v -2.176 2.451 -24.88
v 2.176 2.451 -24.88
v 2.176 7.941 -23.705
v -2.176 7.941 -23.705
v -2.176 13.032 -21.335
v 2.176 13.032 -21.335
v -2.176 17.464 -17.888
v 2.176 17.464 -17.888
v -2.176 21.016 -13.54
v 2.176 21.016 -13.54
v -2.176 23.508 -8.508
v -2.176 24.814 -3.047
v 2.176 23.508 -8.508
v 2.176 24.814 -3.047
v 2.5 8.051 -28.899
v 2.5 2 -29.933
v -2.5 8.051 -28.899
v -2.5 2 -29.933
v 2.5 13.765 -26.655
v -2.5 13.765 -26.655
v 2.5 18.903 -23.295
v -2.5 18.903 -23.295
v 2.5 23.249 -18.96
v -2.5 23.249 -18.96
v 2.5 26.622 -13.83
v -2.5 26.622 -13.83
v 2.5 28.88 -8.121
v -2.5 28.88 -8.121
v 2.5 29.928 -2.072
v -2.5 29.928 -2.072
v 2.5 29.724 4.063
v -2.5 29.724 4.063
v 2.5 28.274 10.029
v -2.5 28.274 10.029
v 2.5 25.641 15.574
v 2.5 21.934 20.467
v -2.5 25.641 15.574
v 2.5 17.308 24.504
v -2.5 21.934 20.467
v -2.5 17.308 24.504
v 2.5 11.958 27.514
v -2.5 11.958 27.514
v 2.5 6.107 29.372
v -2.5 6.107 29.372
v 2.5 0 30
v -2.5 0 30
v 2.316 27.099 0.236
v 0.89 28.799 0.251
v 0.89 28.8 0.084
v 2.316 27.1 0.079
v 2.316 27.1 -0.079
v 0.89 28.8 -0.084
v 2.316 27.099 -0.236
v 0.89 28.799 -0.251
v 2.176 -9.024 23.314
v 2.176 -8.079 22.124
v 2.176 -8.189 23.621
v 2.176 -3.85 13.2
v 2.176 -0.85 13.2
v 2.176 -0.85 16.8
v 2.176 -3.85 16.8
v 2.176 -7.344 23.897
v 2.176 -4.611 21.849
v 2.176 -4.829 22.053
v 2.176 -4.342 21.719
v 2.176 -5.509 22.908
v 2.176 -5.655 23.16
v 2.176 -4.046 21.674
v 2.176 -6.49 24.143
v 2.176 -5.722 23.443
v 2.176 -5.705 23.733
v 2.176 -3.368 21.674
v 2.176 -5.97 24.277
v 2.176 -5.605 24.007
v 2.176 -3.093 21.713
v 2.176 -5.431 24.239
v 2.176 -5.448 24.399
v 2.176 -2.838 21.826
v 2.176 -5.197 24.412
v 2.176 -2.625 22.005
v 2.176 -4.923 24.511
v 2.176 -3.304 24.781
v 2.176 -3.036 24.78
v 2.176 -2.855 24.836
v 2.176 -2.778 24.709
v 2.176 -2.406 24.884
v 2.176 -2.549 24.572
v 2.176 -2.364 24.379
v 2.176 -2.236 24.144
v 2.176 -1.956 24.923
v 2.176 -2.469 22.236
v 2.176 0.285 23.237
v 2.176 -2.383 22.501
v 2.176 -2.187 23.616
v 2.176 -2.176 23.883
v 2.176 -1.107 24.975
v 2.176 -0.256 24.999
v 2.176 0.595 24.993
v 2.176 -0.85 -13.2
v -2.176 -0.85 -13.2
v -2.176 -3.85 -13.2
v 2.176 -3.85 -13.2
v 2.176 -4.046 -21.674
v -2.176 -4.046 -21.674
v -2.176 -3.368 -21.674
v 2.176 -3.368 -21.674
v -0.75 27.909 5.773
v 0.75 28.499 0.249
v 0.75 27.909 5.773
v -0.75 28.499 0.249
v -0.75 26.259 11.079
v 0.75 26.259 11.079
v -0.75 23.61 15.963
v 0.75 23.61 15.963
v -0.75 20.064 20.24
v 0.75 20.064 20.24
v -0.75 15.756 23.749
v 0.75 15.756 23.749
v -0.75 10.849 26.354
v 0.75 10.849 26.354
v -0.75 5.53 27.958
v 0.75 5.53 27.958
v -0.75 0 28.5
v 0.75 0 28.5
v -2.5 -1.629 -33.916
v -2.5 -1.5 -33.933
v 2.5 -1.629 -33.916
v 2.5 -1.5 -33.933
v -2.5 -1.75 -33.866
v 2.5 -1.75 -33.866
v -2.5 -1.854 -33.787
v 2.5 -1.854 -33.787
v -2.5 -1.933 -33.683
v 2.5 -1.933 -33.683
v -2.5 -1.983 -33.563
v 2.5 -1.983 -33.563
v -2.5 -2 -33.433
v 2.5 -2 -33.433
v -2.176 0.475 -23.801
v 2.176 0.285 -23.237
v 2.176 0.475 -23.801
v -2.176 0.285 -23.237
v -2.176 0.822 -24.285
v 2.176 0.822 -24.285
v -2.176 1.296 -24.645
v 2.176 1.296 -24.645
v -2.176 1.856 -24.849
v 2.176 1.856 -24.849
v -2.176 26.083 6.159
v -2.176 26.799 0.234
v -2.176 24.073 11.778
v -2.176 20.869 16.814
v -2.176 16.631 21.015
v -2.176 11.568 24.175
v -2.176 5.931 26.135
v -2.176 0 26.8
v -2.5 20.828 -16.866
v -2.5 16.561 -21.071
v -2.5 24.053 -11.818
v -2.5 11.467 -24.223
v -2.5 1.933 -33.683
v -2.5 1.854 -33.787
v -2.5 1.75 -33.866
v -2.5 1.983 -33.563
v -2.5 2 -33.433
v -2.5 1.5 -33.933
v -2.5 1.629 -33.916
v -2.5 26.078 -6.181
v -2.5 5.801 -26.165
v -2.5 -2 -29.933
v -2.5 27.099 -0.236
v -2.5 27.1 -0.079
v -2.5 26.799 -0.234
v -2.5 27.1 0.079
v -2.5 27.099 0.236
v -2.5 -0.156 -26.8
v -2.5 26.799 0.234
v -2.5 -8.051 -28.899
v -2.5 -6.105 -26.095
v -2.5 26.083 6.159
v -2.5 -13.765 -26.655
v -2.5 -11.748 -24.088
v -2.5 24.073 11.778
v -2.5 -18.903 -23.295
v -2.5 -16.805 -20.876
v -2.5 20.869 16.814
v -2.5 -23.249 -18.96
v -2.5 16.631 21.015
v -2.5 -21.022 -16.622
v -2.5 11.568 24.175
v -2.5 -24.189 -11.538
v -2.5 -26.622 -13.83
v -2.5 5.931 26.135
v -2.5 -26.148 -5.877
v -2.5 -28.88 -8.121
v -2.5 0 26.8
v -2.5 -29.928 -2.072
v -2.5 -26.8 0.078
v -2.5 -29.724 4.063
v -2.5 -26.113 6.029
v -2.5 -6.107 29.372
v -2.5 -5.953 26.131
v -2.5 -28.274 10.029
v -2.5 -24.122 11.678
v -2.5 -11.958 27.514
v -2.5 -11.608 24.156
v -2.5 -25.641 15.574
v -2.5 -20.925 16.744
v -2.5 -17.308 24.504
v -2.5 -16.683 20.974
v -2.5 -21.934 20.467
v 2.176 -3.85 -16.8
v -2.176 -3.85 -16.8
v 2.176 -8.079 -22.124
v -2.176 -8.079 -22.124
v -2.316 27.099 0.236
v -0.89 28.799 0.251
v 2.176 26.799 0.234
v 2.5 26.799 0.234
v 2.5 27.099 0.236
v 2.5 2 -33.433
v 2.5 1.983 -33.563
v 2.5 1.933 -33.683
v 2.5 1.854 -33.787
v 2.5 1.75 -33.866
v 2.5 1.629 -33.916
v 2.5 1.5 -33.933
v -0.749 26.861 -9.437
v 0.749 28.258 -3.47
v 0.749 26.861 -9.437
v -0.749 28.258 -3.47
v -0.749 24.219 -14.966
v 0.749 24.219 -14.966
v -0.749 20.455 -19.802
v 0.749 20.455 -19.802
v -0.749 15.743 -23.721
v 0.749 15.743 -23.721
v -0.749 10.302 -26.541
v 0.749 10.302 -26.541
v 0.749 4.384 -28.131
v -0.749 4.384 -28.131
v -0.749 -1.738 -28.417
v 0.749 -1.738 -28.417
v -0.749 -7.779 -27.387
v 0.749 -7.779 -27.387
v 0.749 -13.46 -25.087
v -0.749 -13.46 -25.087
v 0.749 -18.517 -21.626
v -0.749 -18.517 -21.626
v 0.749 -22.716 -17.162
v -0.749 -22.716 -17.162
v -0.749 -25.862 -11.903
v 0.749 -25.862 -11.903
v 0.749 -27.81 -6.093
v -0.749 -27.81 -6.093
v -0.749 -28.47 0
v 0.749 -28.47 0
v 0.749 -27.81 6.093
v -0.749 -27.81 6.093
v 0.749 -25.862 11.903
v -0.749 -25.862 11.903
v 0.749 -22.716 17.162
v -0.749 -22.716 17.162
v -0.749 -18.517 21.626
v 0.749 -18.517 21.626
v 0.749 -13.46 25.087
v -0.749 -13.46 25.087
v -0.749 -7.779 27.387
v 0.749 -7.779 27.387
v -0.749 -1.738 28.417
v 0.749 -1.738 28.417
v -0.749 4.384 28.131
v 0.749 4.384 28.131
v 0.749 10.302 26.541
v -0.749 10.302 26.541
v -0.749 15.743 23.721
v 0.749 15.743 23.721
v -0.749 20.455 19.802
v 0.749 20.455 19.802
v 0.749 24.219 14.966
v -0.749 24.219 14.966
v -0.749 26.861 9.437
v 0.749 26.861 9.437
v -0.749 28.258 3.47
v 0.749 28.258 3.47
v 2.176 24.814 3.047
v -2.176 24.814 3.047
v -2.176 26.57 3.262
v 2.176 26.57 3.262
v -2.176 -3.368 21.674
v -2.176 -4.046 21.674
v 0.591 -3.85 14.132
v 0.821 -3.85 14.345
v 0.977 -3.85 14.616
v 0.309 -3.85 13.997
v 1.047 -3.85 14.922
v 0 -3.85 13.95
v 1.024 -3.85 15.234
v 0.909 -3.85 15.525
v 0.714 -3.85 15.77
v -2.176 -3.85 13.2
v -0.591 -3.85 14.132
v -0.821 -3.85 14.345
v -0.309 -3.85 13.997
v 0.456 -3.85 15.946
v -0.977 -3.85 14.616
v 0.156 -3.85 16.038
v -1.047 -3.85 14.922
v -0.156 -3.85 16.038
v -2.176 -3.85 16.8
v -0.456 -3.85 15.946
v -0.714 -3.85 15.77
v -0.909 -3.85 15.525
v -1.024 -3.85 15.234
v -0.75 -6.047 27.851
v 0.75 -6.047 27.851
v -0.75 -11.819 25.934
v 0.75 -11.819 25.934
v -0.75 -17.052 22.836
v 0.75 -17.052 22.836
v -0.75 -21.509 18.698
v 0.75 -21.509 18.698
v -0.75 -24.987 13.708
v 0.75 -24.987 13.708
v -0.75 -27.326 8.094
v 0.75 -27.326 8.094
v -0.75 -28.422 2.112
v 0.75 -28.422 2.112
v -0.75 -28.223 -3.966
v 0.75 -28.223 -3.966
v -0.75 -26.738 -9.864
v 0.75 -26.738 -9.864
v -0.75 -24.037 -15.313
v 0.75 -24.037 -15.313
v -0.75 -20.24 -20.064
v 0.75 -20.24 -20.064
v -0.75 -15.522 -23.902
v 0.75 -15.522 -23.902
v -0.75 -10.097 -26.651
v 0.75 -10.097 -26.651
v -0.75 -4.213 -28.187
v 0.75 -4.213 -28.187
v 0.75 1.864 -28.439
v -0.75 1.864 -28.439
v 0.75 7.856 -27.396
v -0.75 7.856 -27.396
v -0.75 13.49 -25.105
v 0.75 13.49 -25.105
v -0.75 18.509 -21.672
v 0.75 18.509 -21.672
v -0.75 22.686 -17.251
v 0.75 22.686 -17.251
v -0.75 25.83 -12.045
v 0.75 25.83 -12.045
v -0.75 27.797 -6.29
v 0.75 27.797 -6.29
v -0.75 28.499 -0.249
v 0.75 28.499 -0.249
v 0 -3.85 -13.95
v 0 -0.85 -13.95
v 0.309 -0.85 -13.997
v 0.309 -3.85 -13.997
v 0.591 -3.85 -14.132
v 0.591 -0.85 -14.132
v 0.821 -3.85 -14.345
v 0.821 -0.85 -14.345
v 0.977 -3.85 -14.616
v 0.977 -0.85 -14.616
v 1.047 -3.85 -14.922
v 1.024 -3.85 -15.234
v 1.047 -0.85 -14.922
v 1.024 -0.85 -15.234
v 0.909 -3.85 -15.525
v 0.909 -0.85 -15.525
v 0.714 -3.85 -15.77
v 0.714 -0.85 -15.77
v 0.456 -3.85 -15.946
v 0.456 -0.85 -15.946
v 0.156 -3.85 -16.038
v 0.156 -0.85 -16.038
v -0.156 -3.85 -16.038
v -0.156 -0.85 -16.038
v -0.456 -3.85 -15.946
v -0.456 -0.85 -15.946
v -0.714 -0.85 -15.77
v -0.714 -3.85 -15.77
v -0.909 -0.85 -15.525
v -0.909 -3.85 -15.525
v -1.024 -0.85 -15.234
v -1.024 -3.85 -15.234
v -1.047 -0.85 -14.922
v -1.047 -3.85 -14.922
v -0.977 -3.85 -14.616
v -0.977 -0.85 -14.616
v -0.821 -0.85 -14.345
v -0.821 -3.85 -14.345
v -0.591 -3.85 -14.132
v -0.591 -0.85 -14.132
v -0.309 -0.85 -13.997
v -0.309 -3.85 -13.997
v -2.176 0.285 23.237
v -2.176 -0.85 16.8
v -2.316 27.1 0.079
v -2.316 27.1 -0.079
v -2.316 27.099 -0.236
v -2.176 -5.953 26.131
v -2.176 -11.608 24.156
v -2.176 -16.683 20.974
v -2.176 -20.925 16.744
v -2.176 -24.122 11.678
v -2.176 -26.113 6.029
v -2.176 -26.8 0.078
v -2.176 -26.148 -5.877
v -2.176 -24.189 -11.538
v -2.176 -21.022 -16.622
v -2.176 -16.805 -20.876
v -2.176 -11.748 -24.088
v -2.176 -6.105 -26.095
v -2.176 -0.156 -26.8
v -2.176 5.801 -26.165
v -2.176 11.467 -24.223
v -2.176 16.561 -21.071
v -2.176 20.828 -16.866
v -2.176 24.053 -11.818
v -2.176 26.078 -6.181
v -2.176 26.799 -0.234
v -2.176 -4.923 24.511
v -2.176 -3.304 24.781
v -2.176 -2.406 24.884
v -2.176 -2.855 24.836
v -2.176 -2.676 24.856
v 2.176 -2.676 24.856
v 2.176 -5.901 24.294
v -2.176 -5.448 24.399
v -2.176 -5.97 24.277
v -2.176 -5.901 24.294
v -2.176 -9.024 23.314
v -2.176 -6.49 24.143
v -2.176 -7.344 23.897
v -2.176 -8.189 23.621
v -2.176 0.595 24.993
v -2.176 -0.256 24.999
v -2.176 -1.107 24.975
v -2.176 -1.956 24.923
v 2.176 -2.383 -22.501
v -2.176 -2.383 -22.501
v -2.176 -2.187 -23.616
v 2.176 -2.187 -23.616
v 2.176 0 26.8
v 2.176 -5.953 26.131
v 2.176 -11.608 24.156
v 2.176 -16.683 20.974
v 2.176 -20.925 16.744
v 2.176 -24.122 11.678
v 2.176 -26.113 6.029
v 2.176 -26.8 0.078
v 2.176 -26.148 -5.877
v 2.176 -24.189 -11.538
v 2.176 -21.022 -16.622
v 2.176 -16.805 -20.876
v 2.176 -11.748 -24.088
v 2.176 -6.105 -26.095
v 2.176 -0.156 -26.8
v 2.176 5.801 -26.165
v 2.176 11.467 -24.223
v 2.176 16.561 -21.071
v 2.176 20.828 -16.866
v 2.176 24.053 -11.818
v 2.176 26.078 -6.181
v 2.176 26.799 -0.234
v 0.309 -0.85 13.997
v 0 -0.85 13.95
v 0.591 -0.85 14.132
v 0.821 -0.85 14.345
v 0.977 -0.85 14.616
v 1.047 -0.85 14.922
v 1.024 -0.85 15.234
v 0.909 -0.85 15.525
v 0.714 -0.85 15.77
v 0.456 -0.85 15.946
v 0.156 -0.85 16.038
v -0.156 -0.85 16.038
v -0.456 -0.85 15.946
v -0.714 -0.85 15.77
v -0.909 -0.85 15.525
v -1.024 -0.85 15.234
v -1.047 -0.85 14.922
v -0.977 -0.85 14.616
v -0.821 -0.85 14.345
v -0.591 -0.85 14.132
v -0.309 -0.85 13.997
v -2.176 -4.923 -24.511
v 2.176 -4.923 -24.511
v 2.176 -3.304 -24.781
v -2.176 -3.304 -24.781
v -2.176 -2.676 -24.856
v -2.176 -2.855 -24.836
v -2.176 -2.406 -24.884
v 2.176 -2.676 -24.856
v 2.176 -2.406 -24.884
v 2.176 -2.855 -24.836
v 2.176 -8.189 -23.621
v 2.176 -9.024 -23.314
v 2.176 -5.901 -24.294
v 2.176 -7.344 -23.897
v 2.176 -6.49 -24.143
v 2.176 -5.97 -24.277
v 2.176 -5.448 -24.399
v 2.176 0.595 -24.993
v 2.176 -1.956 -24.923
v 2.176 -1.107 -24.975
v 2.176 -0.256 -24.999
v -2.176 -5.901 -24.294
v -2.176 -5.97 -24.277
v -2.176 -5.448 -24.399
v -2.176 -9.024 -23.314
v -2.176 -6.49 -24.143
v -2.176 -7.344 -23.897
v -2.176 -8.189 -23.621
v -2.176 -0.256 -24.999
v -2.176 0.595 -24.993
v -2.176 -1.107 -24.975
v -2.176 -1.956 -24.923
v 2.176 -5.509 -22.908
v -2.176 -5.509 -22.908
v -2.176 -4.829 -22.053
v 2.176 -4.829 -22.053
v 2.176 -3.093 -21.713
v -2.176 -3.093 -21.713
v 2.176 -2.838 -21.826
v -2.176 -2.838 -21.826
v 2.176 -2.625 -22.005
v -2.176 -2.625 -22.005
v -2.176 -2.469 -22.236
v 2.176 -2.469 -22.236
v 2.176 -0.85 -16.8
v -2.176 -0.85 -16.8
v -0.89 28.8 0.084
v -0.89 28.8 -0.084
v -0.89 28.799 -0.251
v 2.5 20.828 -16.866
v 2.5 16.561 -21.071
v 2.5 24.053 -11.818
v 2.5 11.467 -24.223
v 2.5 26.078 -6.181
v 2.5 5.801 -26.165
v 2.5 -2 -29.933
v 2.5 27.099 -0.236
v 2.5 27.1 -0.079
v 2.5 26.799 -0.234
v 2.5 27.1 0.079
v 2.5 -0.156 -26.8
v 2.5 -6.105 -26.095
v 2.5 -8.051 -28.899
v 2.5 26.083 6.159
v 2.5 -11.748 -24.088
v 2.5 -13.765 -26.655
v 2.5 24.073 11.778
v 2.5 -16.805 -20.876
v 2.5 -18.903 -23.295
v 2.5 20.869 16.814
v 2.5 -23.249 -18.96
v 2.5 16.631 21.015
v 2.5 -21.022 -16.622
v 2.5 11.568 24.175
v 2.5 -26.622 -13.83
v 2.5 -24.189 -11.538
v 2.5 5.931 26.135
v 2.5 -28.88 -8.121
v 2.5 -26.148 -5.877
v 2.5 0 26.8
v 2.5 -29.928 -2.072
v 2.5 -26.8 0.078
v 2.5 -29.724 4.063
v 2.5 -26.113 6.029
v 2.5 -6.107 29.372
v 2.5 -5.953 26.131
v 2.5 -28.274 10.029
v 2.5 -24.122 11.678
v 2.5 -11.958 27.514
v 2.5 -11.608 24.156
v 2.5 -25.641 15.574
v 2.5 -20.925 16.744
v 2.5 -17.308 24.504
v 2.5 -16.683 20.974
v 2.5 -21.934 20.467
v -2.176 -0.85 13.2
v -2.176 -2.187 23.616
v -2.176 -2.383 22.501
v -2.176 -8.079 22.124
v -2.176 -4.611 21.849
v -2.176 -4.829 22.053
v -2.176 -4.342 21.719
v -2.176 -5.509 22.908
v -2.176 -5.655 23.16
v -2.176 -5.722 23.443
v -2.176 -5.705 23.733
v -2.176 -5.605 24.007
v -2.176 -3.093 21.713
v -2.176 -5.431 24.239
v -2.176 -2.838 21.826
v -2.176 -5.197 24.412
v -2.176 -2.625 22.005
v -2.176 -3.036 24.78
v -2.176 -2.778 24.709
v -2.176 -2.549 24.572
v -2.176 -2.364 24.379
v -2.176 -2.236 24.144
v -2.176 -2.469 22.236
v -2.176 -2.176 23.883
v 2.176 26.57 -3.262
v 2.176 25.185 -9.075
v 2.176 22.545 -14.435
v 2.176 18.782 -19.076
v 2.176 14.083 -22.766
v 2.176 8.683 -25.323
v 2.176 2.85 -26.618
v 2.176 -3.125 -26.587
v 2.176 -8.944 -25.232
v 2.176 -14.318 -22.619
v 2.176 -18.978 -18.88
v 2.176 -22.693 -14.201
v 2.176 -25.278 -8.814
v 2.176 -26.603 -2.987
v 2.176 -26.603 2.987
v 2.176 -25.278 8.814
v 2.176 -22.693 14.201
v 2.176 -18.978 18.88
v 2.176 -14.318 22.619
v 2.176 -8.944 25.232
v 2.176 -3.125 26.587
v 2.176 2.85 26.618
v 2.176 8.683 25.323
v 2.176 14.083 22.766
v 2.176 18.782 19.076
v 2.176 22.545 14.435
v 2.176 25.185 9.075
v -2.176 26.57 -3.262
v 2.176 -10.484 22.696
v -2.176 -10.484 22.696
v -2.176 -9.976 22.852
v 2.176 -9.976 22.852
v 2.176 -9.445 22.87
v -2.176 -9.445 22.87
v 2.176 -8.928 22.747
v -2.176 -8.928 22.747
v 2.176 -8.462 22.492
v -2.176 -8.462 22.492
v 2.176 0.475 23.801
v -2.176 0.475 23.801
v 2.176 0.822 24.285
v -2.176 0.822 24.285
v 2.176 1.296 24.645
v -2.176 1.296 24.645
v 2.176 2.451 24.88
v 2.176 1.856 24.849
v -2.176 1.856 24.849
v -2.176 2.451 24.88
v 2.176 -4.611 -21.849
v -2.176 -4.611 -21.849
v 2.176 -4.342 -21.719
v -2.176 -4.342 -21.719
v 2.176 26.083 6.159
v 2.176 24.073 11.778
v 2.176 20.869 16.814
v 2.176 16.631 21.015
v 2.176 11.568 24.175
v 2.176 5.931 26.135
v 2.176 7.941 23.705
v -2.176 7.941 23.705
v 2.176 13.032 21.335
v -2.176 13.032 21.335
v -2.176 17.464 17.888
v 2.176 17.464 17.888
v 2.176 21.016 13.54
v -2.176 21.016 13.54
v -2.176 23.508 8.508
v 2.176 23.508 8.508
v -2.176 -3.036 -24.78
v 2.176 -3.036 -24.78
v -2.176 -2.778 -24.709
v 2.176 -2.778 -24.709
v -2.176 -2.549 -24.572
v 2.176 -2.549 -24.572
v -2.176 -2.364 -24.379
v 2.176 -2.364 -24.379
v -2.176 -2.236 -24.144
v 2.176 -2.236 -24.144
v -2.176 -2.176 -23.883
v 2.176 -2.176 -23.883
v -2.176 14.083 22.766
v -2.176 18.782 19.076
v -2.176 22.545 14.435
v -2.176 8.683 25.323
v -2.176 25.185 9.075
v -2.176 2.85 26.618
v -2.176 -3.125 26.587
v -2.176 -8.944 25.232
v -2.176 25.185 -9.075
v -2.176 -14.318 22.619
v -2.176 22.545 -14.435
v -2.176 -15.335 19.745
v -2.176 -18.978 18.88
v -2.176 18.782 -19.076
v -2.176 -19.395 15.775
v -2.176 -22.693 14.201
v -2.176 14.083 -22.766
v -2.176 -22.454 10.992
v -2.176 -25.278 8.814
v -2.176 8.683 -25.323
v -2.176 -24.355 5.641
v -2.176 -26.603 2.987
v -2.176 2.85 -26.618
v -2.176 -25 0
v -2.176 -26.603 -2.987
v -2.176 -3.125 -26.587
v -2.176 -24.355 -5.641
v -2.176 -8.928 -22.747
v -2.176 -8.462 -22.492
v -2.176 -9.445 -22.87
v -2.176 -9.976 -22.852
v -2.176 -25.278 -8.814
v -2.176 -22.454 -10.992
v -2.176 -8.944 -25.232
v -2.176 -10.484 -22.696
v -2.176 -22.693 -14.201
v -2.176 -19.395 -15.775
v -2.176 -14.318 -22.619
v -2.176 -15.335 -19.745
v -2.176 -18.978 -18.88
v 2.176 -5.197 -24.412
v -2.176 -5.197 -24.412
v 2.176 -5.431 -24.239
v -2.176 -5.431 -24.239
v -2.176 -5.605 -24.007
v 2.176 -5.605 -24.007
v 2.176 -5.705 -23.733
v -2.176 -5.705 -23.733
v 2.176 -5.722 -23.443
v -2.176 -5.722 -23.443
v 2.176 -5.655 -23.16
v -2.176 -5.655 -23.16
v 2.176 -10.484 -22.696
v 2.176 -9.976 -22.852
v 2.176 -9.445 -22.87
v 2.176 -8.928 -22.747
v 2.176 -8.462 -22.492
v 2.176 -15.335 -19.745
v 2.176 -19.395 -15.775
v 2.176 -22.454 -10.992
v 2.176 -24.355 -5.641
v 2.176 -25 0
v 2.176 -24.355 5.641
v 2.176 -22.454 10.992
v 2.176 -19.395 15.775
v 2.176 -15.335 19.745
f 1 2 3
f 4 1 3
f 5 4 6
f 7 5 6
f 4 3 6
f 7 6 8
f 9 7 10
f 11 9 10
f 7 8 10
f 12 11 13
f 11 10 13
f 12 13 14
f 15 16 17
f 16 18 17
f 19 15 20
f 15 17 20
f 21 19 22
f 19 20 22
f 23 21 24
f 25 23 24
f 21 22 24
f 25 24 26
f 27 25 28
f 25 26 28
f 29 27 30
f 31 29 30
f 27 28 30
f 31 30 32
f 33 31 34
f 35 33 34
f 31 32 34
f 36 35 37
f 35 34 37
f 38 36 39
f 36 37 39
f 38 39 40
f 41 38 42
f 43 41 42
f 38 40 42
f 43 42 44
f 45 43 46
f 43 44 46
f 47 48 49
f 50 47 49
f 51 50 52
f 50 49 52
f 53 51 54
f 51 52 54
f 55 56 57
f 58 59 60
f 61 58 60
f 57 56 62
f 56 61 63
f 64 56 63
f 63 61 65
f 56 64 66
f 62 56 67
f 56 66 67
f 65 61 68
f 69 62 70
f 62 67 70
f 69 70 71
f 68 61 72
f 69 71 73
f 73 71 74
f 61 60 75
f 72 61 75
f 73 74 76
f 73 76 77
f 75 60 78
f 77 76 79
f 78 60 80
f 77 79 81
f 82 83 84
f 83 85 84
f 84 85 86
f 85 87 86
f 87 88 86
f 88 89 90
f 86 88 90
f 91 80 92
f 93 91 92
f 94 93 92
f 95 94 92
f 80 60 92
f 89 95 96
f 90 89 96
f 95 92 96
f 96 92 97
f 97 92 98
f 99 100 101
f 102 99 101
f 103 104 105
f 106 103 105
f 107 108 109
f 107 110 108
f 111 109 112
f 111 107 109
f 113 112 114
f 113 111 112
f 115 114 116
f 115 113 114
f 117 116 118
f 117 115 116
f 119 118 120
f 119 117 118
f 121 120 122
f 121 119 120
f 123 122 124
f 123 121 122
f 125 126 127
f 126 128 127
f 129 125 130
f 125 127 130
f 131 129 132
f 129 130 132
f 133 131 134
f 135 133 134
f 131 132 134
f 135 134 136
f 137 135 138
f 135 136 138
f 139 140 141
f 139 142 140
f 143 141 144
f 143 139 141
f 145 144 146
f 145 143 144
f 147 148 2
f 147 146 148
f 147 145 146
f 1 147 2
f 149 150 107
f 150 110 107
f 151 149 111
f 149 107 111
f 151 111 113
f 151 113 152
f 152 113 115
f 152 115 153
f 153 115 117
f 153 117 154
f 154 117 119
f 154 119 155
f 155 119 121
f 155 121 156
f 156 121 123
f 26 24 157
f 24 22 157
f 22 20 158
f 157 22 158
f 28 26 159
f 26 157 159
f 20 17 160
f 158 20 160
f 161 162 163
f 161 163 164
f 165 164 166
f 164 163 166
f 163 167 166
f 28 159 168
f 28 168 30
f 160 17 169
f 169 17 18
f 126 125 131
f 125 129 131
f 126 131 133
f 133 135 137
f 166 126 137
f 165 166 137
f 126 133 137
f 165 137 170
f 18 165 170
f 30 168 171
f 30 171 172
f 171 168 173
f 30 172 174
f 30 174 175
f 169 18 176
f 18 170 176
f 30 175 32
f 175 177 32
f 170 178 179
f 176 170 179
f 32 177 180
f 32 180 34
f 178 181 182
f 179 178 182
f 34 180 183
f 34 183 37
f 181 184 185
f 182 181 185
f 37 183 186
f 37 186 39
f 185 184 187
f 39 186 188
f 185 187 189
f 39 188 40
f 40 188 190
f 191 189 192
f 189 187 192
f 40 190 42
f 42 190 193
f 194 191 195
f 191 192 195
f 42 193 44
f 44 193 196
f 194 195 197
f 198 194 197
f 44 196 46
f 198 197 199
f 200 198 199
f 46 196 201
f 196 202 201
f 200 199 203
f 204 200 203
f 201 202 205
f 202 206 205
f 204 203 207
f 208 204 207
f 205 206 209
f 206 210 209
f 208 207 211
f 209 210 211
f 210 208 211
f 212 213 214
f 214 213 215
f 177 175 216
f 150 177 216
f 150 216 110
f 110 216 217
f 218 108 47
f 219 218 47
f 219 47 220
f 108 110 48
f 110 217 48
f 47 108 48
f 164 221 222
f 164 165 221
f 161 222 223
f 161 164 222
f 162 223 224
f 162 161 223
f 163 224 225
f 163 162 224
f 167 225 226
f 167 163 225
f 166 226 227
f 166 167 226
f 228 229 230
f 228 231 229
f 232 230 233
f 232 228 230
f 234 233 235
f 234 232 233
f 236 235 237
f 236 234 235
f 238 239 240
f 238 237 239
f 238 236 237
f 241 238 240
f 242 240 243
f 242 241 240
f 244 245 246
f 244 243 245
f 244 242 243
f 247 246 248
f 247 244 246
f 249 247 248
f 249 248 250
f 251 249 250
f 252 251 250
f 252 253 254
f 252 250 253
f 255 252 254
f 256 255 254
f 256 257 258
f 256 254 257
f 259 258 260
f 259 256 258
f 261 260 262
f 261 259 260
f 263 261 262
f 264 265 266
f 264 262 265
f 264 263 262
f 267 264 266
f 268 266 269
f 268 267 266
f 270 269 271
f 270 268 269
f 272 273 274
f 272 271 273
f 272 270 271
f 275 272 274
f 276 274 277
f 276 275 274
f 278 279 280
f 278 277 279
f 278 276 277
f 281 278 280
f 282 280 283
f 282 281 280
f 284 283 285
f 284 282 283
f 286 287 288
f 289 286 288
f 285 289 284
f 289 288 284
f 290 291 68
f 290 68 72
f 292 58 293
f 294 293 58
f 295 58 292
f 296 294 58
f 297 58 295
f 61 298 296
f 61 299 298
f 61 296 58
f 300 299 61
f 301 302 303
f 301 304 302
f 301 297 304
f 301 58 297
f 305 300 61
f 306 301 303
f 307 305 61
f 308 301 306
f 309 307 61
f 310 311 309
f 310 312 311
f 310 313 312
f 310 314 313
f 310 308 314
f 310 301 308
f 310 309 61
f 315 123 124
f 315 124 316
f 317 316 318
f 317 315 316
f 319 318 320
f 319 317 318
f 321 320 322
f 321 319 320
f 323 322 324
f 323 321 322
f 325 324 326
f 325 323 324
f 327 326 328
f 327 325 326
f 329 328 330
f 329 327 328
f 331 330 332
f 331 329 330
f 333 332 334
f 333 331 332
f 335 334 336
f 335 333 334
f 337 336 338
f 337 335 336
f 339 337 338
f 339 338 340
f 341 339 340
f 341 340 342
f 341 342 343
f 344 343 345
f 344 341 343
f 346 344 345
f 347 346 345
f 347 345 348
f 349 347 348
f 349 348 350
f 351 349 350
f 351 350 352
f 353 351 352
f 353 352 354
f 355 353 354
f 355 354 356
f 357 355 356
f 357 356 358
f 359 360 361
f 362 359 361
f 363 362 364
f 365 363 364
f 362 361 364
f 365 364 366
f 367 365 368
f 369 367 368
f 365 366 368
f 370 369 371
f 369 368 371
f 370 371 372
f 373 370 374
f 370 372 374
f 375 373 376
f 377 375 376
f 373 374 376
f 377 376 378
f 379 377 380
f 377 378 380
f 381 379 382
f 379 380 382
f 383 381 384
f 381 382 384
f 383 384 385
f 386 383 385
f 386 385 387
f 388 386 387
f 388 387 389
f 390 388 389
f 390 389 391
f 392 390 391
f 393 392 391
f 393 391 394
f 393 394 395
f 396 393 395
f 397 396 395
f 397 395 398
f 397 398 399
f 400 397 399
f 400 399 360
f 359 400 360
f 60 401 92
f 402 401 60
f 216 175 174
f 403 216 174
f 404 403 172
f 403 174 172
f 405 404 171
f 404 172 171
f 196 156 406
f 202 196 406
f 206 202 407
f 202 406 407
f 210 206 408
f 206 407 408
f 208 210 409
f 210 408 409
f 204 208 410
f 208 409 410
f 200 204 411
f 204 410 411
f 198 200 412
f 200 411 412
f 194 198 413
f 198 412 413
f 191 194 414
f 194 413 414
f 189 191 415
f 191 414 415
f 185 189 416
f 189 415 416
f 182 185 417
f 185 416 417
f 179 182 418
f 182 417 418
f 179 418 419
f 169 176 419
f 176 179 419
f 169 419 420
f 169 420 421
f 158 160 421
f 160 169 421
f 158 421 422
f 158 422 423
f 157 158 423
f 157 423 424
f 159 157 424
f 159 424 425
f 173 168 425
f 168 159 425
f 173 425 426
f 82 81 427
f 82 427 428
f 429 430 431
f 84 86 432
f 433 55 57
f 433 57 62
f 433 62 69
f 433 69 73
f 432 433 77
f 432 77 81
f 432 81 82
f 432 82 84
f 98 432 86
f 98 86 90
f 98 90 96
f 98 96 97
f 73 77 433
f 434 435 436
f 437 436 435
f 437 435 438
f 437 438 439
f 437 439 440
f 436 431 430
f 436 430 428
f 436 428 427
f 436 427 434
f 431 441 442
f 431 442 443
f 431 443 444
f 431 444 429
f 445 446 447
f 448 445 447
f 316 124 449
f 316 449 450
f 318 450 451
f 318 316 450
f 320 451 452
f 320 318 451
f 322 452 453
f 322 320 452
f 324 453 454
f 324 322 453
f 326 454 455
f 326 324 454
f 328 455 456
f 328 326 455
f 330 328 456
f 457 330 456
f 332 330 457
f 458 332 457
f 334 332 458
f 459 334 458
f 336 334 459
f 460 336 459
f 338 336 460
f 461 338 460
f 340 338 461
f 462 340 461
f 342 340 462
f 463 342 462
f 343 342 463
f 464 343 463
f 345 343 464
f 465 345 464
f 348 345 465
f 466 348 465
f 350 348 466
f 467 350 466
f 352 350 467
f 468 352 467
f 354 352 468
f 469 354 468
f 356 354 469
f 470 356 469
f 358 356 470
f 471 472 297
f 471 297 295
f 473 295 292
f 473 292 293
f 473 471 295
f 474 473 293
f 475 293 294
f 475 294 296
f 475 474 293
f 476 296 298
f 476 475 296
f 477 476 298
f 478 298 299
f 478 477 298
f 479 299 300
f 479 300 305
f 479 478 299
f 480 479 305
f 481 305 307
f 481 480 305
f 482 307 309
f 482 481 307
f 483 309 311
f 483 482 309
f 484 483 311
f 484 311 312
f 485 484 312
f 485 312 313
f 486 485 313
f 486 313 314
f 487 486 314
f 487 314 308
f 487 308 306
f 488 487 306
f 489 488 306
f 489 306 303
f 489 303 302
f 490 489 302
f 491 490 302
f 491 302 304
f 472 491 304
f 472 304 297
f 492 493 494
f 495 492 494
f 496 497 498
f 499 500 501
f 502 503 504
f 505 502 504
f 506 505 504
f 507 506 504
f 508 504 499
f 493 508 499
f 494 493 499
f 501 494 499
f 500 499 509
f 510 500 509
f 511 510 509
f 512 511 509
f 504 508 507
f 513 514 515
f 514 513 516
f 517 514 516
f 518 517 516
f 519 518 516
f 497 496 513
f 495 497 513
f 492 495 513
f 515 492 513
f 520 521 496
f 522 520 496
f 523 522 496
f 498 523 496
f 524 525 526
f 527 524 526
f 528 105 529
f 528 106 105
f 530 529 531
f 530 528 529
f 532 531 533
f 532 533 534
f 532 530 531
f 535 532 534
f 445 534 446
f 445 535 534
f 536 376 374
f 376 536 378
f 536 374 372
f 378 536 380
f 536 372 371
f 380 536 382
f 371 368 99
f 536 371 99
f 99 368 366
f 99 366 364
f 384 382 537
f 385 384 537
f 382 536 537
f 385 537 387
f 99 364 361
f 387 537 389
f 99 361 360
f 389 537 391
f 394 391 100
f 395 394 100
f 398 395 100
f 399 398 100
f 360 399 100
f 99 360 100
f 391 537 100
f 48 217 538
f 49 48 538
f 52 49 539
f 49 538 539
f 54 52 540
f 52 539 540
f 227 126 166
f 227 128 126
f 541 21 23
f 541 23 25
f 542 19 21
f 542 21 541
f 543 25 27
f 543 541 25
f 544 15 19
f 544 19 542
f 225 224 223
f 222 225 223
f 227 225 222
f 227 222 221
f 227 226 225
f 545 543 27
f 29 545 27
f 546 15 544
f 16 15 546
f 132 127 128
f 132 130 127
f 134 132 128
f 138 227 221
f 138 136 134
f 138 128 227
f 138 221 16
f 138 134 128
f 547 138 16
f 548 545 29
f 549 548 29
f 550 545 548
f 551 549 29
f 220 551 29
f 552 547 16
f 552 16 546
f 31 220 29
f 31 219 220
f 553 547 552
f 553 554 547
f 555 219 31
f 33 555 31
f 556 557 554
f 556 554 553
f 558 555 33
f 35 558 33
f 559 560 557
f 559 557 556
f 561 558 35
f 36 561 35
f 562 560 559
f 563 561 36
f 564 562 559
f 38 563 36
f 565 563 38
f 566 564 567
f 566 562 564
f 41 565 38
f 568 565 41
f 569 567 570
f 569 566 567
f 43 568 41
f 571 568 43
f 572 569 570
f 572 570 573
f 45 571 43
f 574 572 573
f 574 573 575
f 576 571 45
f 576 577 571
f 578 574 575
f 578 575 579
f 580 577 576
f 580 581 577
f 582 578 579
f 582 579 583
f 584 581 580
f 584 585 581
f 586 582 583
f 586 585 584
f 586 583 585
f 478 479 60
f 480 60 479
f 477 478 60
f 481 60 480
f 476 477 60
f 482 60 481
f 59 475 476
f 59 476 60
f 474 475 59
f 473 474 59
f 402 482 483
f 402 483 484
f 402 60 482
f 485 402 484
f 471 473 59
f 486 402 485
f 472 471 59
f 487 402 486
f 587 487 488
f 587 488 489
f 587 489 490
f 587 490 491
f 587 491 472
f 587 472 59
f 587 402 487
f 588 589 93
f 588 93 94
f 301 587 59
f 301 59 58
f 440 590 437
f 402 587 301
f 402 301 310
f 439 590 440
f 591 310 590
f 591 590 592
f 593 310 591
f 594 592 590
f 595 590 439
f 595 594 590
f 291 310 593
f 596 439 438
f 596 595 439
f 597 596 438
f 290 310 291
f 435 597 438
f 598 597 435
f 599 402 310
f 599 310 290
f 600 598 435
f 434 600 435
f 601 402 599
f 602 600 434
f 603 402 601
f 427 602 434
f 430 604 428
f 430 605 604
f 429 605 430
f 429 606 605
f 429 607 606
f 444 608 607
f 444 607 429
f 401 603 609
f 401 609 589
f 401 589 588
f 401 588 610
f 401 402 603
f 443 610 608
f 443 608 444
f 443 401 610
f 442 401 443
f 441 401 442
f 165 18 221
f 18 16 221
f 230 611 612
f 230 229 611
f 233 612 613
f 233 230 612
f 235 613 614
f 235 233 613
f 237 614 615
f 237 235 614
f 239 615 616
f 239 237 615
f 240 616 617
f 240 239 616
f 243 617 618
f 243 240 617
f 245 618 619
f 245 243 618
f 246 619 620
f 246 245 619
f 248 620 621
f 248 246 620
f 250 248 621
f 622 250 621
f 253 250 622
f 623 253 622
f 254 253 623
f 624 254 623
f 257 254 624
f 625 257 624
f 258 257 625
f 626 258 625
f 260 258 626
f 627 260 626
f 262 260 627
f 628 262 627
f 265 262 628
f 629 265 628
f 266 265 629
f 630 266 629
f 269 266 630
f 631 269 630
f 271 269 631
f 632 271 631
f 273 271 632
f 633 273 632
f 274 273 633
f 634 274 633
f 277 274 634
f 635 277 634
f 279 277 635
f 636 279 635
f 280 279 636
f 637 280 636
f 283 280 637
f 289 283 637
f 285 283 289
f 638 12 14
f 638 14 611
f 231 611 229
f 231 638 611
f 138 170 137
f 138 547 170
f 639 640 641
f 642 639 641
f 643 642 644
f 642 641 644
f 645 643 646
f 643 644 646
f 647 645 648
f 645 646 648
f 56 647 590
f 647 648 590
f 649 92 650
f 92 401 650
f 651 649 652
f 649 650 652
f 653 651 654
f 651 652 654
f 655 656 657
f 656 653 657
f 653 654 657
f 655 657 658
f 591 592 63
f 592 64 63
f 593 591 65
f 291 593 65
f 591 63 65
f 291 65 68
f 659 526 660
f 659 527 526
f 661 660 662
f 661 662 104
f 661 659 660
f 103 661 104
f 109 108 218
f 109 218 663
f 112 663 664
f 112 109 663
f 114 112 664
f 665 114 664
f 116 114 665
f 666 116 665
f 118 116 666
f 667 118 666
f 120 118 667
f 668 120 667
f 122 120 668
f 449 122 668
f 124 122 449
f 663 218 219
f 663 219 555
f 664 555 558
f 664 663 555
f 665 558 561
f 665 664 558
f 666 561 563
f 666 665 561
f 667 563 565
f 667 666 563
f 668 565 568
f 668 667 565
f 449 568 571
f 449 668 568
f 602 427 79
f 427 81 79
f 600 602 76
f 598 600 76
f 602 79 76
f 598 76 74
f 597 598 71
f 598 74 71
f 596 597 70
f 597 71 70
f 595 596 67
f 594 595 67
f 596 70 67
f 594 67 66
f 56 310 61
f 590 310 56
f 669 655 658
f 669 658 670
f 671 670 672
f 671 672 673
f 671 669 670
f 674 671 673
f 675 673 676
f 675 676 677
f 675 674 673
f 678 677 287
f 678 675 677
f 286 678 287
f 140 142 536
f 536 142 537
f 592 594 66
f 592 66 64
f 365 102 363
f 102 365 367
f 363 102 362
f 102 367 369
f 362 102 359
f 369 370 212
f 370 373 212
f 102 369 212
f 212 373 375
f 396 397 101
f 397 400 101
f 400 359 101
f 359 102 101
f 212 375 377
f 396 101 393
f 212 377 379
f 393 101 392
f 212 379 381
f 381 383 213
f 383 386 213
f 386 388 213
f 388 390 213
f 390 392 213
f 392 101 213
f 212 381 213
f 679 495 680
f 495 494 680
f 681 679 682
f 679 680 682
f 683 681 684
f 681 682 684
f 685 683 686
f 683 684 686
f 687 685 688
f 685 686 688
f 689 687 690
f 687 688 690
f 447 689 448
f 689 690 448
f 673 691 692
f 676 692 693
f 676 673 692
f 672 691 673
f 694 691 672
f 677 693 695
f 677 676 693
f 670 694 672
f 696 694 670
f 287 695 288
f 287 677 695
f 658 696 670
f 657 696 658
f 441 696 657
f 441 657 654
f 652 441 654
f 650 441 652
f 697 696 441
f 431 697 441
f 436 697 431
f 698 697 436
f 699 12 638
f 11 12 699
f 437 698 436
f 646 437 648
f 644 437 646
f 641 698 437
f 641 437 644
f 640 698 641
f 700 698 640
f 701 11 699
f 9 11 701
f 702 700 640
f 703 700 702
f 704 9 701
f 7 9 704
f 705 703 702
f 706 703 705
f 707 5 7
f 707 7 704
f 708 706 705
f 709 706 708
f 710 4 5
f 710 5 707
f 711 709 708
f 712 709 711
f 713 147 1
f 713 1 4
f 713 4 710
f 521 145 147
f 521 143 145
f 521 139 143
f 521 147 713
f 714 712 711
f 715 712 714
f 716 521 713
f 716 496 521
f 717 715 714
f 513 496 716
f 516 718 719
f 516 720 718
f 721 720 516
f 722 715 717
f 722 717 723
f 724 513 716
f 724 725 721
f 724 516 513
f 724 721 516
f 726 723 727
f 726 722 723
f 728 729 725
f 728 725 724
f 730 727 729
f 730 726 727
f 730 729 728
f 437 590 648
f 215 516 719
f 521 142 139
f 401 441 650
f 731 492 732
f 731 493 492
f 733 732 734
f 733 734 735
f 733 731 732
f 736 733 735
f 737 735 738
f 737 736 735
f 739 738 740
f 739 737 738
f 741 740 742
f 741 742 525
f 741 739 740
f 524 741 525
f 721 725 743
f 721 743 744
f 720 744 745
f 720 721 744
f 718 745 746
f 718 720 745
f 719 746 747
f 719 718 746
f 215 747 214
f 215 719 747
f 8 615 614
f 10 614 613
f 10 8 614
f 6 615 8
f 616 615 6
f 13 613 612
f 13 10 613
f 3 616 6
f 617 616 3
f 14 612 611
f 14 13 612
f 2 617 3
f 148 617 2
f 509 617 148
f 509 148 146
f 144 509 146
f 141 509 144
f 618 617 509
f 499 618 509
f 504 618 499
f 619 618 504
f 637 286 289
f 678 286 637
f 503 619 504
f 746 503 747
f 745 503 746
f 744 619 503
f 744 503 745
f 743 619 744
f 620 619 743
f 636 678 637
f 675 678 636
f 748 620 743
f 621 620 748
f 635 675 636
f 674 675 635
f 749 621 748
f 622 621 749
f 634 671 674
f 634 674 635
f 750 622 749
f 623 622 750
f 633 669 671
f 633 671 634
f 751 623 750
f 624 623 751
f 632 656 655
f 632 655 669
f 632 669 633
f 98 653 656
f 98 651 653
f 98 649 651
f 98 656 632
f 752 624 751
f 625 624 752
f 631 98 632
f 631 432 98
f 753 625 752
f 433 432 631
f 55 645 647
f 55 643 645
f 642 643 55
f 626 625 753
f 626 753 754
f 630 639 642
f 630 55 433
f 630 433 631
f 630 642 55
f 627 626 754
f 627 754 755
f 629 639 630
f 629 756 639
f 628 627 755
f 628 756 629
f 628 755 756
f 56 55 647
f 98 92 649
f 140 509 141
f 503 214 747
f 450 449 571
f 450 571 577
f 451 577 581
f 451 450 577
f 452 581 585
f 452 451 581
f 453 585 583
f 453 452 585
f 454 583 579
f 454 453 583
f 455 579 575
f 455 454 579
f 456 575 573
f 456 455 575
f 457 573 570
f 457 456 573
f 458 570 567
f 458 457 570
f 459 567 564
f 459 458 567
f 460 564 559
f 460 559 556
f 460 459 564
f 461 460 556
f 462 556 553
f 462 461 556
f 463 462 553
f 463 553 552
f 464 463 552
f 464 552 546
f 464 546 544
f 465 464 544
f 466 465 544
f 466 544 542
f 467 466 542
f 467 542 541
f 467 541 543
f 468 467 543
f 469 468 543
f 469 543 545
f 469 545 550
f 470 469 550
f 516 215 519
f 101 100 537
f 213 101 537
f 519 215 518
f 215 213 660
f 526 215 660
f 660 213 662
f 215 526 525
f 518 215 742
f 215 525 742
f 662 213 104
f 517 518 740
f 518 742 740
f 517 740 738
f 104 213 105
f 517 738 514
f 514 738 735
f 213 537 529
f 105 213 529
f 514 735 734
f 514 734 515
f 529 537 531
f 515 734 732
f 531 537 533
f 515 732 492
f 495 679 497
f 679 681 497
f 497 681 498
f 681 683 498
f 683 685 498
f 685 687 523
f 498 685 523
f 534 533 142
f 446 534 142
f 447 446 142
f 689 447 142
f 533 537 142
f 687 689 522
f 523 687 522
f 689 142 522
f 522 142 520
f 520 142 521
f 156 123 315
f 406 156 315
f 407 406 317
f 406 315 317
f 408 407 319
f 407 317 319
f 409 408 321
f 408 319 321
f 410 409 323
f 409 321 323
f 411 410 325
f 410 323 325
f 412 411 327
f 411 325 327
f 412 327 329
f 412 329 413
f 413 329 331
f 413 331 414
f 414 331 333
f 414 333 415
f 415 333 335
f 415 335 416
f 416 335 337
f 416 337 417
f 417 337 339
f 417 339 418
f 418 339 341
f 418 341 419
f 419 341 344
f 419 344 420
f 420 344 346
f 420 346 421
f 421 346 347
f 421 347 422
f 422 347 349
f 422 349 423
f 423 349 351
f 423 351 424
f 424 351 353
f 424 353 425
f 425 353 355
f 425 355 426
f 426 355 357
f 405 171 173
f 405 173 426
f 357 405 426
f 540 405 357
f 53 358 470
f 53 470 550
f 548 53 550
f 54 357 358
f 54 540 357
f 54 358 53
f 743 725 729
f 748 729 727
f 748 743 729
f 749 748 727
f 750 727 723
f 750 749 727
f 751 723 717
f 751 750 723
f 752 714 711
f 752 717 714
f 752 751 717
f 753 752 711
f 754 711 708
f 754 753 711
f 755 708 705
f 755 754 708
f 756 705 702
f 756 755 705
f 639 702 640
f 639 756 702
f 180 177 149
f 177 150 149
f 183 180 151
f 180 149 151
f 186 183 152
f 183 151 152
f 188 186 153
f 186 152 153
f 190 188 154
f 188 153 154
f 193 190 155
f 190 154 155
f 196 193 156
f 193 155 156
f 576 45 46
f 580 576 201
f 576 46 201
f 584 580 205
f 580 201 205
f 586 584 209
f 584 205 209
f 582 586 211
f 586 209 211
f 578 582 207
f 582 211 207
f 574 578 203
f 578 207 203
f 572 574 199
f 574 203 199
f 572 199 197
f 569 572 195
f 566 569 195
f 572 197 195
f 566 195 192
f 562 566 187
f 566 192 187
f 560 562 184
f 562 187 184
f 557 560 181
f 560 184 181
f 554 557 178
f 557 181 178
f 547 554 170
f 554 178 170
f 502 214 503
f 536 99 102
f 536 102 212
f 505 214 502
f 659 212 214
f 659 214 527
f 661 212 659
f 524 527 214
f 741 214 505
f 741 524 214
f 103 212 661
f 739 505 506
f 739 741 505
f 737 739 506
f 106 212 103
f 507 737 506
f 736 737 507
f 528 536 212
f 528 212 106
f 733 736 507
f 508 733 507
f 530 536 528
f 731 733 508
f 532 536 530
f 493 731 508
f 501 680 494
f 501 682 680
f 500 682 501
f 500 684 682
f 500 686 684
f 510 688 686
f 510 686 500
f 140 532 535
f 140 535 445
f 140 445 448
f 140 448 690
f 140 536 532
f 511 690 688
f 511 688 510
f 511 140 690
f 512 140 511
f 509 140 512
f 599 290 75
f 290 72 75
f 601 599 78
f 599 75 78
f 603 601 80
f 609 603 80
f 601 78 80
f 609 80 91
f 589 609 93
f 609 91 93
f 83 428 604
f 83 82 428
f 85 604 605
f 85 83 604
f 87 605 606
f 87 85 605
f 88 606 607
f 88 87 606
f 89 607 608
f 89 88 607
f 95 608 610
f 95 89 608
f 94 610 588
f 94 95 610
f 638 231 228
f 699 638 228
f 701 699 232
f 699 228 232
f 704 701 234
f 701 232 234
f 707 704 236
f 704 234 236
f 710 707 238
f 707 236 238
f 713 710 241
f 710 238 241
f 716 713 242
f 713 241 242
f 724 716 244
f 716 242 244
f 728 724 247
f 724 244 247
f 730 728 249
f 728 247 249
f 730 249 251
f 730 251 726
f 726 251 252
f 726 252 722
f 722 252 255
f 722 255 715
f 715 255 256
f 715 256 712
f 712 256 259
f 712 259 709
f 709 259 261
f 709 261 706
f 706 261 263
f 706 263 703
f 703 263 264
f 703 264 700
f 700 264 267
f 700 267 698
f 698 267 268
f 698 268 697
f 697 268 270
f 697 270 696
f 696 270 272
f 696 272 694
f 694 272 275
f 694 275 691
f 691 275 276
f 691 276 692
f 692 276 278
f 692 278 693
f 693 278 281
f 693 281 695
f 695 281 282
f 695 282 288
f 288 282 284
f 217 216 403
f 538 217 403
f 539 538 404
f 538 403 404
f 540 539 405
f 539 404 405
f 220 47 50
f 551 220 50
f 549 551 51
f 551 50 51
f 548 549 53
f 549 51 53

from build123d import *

# Parameters (mm, degrees)
REVOLVE2_ANGLE      = 173
BOSS_EXTRUDE1_START = -2.176469
BOSS_EXTRUDE1_DEPTH = 4.352938
FILLET1_R           = 2
FILLET2_R           = 1
CUT_EXTRUDE1_REACH  = 44.5
SKETCH4_R           = 1.05
SKETCH5_W           = 4
SKETCH5_H           = 4
BOSS_EXTRUDE2_DEPTH = 2.5
FILLET3_R           = 0.5
CUT_REVOLVE2_ANGLE  = 1


# Read off the part's stored shape, not the designer's step: Revolve2
with BuildPart() as part:
    # Sketch2 → Revolve1 (revolve)
    with BuildSketch(Plane(origin=(0, 0, 0), x_dir=(1, 0, 0), z_dir=(0, 1, 0)), mode=Mode.PRIVATE) as revolve1_sk:
        Polygon((-0.75, 28.5), (0, 28.5), (0, 30), (-2.5, 30), (-2.5, 26.8), (-2.176469373, 26.8), align=None)
    revolve1 = revolve(revolve1_sk.sketch.rotate(Axis((0, 0, 0), (1, 0, 0)), 180), axis=Axis((0, 0, 0), (1, 0, 0)))


with BuildPart() as body_2:
    # Revolve2 outline → Revolve2 (revolve)
    with BuildSketch(Plane(origin=(0, 0, 0), x_dir=(0, -1, 0), z_dir=(0, 0, 1))):
        Polygon((25, 0), (25, -2.176469373), (26.77, -2.176469373), (26.77, -2.175534216), (28.47, -0.749064843), (28.47, 0), align=None)
    revolve2 = revolve(axis=Axis((0, 0, 0), (1, 0, 0)), revolution_arc=REVOLVE2_ANGLE)


with BuildPart() as part_1:
    add(part.part)

    add(body_2.part)  # Mirror1 merges body 2
    # Mirror1: Revolve1, Revolve2 across plane
    add(revolve1.mirror(Plane(origin=(0, 0, 0), x_dir=(0, 0, 1), z_dir=(1, 0, 0))))
    add(revolve2.mirror(Plane(origin=(0, 0, 0), x_dir=(0, 0, 1), z_dir=(1, 0, 0))))

    # Sketch3 → Boss-Extrude1 (add)
    with BuildSketch(Plane(origin=(0, 0, 0), x_dir=(0, 0, -1), z_dir=(1, 0, 0)).offset(BOSS_EXTRUDE1_START)):
        with BuildLine():
            Line((24.992927205, 0.594634117), (16.8, -0.85))
            Line((16.8, -0.85), (13.2, -0.85))
            Line((13.2, -0.85), (13.2, -3.85))
            Line((13.2, -3.85), (16.8, -3.85))
            Line((16.8, -3.85), (23.314414659, -9.024304356))
            ThreePointArc((23.314414659, -9.024304356), (23.762509208, -7.768085746), (24.142970944, -6.489757623))
            Line((24.142970944, -6.489757623), (21.674472629, -4.529065489))
            Line((21.674472629, -4.529065489), (21.674472629, -2.529065489))
            Line((21.674472629, -2.529065489), (24.923348035, -1.956201097))
            ThreePointArc((24.923348035, -1.956201097), (24.990704742, -0.681671824), (24.992927205, 0.594634117))
        make_face()
    extrude(amount=BOSS_EXTRUDE1_DEPTH)

    # Fillet1
    # the kernel refuses this fillet: 2 mm, written as the material it adds along each edge
    with BuildSketch(Plane(origin=(-6.825018134, 0.594634117, -24.992927205), x_dir=(0, 0.9981410168670989, 0.06094678373395691), z_dir=(1, 0, 0))) as fillet1_piece_1_section:
        with BuildLine():
            CenterArc((1.785042868, 1.998616545), FILLET1_R, 186.505841055, 85.625388348)
            Line((-0.202077752, 1.772007538), (0, 0))
            ThreePointArc((0, 0), (0.929709827, -0.017293188), (1.859419654, 0))
        make_face()
    fillet1_piece_1 = extrude(amount=13.650036268, mode=Mode.PRIVATE)
    fillet1_piece_1 = split(fillet1_piece_1, bisect_by=Plane(origin=(-2.176469373, 0.943690029, -24.587007533), z_dir=(1, 0, 0)), keep=Keep.TOP, mode=Mode.PRIVATE)
    fillet1_piece_1 = split(fillet1_piece_1, bisect_by=Plane(origin=(2.176469373, 0.943690029, -24.587007533), z_dir=(-1, 0, 0)), keep=Keep.TOP, mode=Mode.PRIVATE)
    add(fillet1_piece_1)
    with BuildSketch(Plane(origin=(-6.138912646, -9.024304356, -23.314414659), x_dir=(0, -0.9206652582937424, 0.39035302249491644), z_dir=(1, 0, 0))) as fillet1_piece_2_section:
        with BuildLine():
            CenterArc((1.52157836, -1.998994886), FILLET1_R, 88.183445303, 76.333419365)
            Line((-0.405839783, -1.465085435), (0, 0))
            ThreePointArc((0, 0), (0.792488729, 0.012563925), (1.584977458, 0))
        make_face()
    fillet1_piece_2 = extrude(amount=12.277825292, mode=Mode.PRIVATE)
    fillet1_piece_2 = split(fillet1_piece_2, bisect_by=Plane(origin=(-2.176469373, -9.144329866, -22.922792538), z_dir=(1, 0, 0)), keep=Keep.TOP, mode=Mode.PRIVATE)
    fillet1_piece_2 = split(fillet1_piece_2, bisect_by=Plane(origin=(2.176469373, -9.144329866, -22.922792538), z_dir=(-1, 0, 0)), keep=Keep.TOP, mode=Mode.PRIVATE)
    add(fillet1_piece_2)

    # Fillet2
    fillet2_edges = [part_1.edges().sort_by_distance(p)[0] for p in [
        (0, -1.956201097, -24.923348035),
        (0, -2.529065489, -21.674472629),
        (0, -4.529065489, -21.674472629),
        (0, -6.489757623, -24.142970944),
    ]]
    fillet(fillet2_edges, radius=FILLET2_R)

    # Sketch4 → Cut-Extrude1 (cut, up to next)
    with BuildSketch(Plane(origin=(0, 0, 0), x_dir=(1, 0, 0), z_dir=(0, 1, 0)), mode=Mode.PRIVATE) as cut_extrude1_sk1:
        with Locations(Location((0, 15, 0), (0, 0, 270))):
            Circle(SKETCH4_R)
    cut_extrude1_tool1 = extrude(cut_extrude1_sk1.sketch, amount=-CUT_EXTRUDE1_REACH, mode=Mode.PRIVATE) & part_1.part
    add(cut_extrude1_tool1.solids().sort_by_distance((0, 0, -15))[0], mode=Mode.SUBTRACT)

    # Mirror2: part across plane


with BuildPart() as part_2:
    add(part_1.part)
    add(part_1.part.mirror(Plane.XY))

    # Sketch5 → Boss-Extrude2 (add, symmetric)
    with BuildSketch(Plane(origin=(0, 0, 0), x_dir=(0, 0, -1), z_dir=(1, 0, 0))):
        with Locations((31.933259094, 0)):
            Rectangle(SKETCH5_W, SKETCH5_H)
    extrude(amount=BOSS_EXTRUDE2_DEPTH, both=True)

    # Fillet3
    fillet3_edges = [part_2.edges().sort_by_distance(p)[0] for p in [
        (0, 2, -33.933259094),
        (0, -2, -33.933259094),
    ]]
    fillet(fillet3_edges, radius=FILLET3_R)

    # Sketch6 → Cut-Revolve2 (revolve, symmetric, cut)
    with BuildSketch(Plane.XY) as cut_revolve2_sk:
        Polygon((2.5, 27.1), (2.31636167, 27.1), (0.889892297, 28.8), (-0.889892297, 28.8), (-2.31636167, 27.1), (-2.5, 27.1), (-2.5, 26.8), (-2.176469373, 26.8), (-0.75, 28.5), (0.75, 28.5), (2.176469373, 26.8), (2.5, 26.8), align=None)
    revolve(axis=Axis((0, 0, 0), (1, 0, 0)), revolution_arc=CUT_REVOLVE2_ANGLE / 2, mode=Mode.SUBTRACT)
    revolve(cut_revolve2_sk.sketch, axis=Axis((0, 0, 0), (-1, 0, 0)), revolution_arc=CUT_REVOLVE2_ANGLE / 2, mode=Mode.SUBTRACT)


solid = part_2.part
